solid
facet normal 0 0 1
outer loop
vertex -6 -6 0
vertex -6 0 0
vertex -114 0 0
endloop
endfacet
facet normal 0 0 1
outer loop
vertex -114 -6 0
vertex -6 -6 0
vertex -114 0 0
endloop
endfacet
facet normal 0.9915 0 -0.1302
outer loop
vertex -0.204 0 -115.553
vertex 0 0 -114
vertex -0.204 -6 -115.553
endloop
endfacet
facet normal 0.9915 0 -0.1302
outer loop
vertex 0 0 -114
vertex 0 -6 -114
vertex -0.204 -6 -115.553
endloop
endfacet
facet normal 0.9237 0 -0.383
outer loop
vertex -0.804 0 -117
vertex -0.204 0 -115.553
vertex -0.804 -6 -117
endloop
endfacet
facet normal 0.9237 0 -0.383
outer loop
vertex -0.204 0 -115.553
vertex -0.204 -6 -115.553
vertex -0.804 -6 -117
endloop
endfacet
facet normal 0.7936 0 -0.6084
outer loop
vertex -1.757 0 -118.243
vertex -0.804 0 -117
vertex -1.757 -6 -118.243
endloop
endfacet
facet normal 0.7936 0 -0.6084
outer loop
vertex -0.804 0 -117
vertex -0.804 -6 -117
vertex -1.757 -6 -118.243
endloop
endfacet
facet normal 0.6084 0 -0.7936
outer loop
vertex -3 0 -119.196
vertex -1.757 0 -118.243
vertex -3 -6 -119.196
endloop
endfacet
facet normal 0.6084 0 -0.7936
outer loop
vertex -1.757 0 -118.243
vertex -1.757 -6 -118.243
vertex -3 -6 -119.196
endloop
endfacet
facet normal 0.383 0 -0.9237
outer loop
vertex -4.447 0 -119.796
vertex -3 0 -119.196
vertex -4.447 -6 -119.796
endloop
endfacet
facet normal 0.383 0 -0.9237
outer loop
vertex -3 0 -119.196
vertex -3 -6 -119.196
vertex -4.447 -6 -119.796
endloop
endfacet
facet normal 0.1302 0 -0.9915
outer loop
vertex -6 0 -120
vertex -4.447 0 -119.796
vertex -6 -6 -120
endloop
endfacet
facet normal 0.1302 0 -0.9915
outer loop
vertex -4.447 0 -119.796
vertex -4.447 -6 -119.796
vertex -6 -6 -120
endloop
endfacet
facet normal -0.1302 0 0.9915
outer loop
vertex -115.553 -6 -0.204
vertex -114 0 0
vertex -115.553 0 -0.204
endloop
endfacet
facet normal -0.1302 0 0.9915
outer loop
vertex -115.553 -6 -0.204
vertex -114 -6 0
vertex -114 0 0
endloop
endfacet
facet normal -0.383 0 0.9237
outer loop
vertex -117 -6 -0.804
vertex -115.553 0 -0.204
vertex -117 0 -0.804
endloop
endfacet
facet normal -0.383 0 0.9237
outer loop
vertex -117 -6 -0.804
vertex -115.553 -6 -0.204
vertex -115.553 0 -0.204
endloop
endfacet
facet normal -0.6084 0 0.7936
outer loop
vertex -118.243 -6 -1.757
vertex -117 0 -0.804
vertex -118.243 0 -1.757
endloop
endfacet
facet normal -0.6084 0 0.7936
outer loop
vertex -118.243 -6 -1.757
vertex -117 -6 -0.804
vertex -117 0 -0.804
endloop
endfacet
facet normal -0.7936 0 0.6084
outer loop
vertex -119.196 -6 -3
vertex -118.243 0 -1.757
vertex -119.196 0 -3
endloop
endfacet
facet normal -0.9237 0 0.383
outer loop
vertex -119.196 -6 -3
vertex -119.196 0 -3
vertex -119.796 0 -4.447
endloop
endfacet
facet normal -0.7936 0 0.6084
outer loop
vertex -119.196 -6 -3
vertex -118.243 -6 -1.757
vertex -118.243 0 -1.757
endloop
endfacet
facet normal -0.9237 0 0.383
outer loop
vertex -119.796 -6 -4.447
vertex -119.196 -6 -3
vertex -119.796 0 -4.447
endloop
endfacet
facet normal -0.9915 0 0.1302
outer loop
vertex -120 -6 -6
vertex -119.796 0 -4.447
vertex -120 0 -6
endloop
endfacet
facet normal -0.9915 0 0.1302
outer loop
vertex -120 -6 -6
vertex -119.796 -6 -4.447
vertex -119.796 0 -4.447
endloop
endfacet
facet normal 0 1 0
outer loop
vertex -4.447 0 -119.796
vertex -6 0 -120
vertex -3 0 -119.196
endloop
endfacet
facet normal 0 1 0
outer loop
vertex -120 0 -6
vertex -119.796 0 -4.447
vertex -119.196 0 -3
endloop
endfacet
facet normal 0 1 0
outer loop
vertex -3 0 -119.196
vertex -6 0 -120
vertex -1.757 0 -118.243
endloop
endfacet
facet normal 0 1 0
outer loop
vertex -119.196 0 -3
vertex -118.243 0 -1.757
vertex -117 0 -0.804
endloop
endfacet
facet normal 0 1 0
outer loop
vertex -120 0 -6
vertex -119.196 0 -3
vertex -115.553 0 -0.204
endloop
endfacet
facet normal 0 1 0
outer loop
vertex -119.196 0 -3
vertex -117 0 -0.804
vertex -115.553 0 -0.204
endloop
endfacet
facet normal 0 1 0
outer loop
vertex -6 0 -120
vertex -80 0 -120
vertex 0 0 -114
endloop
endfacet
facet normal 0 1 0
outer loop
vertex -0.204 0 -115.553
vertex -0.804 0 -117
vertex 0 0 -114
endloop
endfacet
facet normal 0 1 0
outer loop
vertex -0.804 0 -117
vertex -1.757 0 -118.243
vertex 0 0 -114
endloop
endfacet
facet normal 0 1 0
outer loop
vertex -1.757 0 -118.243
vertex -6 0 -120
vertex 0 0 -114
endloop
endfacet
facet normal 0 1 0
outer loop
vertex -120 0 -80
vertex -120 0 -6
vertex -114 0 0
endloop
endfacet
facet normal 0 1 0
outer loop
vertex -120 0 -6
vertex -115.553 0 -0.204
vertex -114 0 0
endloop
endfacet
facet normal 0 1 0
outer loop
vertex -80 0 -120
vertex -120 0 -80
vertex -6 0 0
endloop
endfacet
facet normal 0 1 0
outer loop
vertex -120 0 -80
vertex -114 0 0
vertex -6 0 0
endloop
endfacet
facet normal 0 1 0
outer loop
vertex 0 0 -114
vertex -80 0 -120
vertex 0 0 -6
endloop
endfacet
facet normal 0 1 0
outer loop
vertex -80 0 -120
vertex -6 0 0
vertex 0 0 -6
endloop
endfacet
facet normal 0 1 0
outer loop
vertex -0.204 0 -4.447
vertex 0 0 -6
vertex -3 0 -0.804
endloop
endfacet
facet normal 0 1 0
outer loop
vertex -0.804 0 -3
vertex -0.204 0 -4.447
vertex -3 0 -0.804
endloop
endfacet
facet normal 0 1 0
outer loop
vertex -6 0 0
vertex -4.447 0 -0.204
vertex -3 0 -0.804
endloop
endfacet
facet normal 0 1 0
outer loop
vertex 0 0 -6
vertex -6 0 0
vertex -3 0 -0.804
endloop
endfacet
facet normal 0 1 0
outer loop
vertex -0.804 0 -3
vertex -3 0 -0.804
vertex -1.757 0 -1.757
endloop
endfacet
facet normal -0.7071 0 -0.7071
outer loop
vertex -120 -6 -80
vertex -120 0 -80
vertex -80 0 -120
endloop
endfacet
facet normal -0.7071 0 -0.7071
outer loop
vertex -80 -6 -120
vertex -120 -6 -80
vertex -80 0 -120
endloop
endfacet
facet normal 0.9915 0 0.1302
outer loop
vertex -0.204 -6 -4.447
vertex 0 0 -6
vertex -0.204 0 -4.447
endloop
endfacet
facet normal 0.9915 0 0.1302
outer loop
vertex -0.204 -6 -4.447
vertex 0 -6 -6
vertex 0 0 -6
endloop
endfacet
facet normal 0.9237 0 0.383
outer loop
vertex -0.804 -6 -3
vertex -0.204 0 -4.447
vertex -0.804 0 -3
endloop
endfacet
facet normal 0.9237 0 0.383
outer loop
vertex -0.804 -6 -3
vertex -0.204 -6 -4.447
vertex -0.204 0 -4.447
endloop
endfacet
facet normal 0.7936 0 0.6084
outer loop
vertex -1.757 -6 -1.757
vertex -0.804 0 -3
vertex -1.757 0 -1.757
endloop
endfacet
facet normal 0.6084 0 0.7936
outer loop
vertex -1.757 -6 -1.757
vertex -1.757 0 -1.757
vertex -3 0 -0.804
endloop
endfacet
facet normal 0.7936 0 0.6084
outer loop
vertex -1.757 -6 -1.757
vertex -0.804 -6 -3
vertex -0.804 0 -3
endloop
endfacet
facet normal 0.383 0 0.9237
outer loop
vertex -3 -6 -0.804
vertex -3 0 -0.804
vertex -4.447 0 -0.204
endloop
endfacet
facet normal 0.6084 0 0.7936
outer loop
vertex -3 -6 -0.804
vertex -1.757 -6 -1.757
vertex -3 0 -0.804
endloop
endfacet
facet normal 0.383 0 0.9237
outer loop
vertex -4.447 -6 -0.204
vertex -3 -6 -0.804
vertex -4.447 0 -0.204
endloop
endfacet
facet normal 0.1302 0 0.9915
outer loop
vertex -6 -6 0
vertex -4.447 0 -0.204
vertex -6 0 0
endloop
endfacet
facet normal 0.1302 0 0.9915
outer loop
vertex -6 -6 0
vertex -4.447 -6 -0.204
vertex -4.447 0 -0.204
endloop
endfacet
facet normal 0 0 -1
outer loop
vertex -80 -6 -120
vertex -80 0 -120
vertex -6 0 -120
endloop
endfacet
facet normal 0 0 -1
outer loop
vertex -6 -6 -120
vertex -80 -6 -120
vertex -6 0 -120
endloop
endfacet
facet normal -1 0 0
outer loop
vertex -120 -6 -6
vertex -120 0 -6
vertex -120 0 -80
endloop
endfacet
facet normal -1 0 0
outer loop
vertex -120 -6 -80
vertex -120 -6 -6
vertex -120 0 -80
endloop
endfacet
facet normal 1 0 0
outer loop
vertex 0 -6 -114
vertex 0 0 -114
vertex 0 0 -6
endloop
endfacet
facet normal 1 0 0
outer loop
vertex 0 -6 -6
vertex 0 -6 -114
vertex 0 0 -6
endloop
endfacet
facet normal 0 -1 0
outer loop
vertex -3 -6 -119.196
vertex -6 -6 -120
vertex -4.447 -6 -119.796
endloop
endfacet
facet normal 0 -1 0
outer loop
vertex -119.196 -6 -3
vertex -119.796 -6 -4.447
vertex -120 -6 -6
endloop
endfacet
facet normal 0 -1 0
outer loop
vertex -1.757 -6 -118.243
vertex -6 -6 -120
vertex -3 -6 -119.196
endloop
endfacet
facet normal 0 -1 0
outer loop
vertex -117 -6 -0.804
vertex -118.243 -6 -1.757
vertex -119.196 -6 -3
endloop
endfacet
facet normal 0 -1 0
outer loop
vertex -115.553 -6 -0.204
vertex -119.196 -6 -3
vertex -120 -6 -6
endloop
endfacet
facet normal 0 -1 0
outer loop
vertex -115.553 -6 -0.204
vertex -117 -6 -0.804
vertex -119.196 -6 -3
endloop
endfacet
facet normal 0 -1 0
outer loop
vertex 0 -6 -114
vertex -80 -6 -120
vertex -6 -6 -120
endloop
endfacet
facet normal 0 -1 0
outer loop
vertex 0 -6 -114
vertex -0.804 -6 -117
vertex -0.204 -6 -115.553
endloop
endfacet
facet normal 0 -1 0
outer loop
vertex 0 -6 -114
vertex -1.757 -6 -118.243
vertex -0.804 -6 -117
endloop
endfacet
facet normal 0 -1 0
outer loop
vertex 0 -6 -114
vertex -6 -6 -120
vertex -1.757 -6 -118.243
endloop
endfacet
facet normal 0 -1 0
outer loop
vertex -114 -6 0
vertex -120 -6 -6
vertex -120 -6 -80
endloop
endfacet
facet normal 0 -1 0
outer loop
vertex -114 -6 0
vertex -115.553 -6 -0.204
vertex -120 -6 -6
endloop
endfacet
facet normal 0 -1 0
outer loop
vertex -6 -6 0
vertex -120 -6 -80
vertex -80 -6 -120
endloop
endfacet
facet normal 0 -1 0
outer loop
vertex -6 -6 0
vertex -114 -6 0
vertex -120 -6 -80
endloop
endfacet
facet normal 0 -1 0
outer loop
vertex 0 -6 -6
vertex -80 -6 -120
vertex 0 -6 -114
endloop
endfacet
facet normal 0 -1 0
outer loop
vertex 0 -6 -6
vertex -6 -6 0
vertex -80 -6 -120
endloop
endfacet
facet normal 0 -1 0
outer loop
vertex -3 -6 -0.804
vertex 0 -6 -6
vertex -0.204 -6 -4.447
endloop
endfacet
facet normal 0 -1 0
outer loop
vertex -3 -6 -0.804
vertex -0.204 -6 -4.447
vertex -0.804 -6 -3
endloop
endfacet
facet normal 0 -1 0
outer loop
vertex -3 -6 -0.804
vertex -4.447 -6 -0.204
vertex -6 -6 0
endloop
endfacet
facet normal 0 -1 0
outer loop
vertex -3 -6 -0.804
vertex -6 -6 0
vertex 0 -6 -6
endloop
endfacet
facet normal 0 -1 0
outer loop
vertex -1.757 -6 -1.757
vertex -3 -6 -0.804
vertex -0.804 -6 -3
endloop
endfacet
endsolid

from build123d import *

# Parameters (mm, degrees)
F1_DEPTH = 6
F2_R     = 6
F3_R     = 6


with BuildPart() as f1:
    # F0 (on Front) → F1 (new body)
    with BuildSketch(Plane.XZ):
        Polygon((0, -120), (0, 0), (-120, 0), (-120, -80), (-80, -120), align=None)
    extrude(amount=F1_DEPTH)

    # F2
    f2_edges = [f1.edges().sort_by_distance(p)[0] for p in [
        (0, -3, 0),
    ]]
    fillet(f2_edges, radius=F2_R)

    # F3
    f3_edges = [f1.edges().sort_by_distance(p)[0] for p in [
        (-120, -3, 0),
        (0, -3, -120),
    ]]
    fillet(f3_edges, radius=F3_R)


solid = f1.part
